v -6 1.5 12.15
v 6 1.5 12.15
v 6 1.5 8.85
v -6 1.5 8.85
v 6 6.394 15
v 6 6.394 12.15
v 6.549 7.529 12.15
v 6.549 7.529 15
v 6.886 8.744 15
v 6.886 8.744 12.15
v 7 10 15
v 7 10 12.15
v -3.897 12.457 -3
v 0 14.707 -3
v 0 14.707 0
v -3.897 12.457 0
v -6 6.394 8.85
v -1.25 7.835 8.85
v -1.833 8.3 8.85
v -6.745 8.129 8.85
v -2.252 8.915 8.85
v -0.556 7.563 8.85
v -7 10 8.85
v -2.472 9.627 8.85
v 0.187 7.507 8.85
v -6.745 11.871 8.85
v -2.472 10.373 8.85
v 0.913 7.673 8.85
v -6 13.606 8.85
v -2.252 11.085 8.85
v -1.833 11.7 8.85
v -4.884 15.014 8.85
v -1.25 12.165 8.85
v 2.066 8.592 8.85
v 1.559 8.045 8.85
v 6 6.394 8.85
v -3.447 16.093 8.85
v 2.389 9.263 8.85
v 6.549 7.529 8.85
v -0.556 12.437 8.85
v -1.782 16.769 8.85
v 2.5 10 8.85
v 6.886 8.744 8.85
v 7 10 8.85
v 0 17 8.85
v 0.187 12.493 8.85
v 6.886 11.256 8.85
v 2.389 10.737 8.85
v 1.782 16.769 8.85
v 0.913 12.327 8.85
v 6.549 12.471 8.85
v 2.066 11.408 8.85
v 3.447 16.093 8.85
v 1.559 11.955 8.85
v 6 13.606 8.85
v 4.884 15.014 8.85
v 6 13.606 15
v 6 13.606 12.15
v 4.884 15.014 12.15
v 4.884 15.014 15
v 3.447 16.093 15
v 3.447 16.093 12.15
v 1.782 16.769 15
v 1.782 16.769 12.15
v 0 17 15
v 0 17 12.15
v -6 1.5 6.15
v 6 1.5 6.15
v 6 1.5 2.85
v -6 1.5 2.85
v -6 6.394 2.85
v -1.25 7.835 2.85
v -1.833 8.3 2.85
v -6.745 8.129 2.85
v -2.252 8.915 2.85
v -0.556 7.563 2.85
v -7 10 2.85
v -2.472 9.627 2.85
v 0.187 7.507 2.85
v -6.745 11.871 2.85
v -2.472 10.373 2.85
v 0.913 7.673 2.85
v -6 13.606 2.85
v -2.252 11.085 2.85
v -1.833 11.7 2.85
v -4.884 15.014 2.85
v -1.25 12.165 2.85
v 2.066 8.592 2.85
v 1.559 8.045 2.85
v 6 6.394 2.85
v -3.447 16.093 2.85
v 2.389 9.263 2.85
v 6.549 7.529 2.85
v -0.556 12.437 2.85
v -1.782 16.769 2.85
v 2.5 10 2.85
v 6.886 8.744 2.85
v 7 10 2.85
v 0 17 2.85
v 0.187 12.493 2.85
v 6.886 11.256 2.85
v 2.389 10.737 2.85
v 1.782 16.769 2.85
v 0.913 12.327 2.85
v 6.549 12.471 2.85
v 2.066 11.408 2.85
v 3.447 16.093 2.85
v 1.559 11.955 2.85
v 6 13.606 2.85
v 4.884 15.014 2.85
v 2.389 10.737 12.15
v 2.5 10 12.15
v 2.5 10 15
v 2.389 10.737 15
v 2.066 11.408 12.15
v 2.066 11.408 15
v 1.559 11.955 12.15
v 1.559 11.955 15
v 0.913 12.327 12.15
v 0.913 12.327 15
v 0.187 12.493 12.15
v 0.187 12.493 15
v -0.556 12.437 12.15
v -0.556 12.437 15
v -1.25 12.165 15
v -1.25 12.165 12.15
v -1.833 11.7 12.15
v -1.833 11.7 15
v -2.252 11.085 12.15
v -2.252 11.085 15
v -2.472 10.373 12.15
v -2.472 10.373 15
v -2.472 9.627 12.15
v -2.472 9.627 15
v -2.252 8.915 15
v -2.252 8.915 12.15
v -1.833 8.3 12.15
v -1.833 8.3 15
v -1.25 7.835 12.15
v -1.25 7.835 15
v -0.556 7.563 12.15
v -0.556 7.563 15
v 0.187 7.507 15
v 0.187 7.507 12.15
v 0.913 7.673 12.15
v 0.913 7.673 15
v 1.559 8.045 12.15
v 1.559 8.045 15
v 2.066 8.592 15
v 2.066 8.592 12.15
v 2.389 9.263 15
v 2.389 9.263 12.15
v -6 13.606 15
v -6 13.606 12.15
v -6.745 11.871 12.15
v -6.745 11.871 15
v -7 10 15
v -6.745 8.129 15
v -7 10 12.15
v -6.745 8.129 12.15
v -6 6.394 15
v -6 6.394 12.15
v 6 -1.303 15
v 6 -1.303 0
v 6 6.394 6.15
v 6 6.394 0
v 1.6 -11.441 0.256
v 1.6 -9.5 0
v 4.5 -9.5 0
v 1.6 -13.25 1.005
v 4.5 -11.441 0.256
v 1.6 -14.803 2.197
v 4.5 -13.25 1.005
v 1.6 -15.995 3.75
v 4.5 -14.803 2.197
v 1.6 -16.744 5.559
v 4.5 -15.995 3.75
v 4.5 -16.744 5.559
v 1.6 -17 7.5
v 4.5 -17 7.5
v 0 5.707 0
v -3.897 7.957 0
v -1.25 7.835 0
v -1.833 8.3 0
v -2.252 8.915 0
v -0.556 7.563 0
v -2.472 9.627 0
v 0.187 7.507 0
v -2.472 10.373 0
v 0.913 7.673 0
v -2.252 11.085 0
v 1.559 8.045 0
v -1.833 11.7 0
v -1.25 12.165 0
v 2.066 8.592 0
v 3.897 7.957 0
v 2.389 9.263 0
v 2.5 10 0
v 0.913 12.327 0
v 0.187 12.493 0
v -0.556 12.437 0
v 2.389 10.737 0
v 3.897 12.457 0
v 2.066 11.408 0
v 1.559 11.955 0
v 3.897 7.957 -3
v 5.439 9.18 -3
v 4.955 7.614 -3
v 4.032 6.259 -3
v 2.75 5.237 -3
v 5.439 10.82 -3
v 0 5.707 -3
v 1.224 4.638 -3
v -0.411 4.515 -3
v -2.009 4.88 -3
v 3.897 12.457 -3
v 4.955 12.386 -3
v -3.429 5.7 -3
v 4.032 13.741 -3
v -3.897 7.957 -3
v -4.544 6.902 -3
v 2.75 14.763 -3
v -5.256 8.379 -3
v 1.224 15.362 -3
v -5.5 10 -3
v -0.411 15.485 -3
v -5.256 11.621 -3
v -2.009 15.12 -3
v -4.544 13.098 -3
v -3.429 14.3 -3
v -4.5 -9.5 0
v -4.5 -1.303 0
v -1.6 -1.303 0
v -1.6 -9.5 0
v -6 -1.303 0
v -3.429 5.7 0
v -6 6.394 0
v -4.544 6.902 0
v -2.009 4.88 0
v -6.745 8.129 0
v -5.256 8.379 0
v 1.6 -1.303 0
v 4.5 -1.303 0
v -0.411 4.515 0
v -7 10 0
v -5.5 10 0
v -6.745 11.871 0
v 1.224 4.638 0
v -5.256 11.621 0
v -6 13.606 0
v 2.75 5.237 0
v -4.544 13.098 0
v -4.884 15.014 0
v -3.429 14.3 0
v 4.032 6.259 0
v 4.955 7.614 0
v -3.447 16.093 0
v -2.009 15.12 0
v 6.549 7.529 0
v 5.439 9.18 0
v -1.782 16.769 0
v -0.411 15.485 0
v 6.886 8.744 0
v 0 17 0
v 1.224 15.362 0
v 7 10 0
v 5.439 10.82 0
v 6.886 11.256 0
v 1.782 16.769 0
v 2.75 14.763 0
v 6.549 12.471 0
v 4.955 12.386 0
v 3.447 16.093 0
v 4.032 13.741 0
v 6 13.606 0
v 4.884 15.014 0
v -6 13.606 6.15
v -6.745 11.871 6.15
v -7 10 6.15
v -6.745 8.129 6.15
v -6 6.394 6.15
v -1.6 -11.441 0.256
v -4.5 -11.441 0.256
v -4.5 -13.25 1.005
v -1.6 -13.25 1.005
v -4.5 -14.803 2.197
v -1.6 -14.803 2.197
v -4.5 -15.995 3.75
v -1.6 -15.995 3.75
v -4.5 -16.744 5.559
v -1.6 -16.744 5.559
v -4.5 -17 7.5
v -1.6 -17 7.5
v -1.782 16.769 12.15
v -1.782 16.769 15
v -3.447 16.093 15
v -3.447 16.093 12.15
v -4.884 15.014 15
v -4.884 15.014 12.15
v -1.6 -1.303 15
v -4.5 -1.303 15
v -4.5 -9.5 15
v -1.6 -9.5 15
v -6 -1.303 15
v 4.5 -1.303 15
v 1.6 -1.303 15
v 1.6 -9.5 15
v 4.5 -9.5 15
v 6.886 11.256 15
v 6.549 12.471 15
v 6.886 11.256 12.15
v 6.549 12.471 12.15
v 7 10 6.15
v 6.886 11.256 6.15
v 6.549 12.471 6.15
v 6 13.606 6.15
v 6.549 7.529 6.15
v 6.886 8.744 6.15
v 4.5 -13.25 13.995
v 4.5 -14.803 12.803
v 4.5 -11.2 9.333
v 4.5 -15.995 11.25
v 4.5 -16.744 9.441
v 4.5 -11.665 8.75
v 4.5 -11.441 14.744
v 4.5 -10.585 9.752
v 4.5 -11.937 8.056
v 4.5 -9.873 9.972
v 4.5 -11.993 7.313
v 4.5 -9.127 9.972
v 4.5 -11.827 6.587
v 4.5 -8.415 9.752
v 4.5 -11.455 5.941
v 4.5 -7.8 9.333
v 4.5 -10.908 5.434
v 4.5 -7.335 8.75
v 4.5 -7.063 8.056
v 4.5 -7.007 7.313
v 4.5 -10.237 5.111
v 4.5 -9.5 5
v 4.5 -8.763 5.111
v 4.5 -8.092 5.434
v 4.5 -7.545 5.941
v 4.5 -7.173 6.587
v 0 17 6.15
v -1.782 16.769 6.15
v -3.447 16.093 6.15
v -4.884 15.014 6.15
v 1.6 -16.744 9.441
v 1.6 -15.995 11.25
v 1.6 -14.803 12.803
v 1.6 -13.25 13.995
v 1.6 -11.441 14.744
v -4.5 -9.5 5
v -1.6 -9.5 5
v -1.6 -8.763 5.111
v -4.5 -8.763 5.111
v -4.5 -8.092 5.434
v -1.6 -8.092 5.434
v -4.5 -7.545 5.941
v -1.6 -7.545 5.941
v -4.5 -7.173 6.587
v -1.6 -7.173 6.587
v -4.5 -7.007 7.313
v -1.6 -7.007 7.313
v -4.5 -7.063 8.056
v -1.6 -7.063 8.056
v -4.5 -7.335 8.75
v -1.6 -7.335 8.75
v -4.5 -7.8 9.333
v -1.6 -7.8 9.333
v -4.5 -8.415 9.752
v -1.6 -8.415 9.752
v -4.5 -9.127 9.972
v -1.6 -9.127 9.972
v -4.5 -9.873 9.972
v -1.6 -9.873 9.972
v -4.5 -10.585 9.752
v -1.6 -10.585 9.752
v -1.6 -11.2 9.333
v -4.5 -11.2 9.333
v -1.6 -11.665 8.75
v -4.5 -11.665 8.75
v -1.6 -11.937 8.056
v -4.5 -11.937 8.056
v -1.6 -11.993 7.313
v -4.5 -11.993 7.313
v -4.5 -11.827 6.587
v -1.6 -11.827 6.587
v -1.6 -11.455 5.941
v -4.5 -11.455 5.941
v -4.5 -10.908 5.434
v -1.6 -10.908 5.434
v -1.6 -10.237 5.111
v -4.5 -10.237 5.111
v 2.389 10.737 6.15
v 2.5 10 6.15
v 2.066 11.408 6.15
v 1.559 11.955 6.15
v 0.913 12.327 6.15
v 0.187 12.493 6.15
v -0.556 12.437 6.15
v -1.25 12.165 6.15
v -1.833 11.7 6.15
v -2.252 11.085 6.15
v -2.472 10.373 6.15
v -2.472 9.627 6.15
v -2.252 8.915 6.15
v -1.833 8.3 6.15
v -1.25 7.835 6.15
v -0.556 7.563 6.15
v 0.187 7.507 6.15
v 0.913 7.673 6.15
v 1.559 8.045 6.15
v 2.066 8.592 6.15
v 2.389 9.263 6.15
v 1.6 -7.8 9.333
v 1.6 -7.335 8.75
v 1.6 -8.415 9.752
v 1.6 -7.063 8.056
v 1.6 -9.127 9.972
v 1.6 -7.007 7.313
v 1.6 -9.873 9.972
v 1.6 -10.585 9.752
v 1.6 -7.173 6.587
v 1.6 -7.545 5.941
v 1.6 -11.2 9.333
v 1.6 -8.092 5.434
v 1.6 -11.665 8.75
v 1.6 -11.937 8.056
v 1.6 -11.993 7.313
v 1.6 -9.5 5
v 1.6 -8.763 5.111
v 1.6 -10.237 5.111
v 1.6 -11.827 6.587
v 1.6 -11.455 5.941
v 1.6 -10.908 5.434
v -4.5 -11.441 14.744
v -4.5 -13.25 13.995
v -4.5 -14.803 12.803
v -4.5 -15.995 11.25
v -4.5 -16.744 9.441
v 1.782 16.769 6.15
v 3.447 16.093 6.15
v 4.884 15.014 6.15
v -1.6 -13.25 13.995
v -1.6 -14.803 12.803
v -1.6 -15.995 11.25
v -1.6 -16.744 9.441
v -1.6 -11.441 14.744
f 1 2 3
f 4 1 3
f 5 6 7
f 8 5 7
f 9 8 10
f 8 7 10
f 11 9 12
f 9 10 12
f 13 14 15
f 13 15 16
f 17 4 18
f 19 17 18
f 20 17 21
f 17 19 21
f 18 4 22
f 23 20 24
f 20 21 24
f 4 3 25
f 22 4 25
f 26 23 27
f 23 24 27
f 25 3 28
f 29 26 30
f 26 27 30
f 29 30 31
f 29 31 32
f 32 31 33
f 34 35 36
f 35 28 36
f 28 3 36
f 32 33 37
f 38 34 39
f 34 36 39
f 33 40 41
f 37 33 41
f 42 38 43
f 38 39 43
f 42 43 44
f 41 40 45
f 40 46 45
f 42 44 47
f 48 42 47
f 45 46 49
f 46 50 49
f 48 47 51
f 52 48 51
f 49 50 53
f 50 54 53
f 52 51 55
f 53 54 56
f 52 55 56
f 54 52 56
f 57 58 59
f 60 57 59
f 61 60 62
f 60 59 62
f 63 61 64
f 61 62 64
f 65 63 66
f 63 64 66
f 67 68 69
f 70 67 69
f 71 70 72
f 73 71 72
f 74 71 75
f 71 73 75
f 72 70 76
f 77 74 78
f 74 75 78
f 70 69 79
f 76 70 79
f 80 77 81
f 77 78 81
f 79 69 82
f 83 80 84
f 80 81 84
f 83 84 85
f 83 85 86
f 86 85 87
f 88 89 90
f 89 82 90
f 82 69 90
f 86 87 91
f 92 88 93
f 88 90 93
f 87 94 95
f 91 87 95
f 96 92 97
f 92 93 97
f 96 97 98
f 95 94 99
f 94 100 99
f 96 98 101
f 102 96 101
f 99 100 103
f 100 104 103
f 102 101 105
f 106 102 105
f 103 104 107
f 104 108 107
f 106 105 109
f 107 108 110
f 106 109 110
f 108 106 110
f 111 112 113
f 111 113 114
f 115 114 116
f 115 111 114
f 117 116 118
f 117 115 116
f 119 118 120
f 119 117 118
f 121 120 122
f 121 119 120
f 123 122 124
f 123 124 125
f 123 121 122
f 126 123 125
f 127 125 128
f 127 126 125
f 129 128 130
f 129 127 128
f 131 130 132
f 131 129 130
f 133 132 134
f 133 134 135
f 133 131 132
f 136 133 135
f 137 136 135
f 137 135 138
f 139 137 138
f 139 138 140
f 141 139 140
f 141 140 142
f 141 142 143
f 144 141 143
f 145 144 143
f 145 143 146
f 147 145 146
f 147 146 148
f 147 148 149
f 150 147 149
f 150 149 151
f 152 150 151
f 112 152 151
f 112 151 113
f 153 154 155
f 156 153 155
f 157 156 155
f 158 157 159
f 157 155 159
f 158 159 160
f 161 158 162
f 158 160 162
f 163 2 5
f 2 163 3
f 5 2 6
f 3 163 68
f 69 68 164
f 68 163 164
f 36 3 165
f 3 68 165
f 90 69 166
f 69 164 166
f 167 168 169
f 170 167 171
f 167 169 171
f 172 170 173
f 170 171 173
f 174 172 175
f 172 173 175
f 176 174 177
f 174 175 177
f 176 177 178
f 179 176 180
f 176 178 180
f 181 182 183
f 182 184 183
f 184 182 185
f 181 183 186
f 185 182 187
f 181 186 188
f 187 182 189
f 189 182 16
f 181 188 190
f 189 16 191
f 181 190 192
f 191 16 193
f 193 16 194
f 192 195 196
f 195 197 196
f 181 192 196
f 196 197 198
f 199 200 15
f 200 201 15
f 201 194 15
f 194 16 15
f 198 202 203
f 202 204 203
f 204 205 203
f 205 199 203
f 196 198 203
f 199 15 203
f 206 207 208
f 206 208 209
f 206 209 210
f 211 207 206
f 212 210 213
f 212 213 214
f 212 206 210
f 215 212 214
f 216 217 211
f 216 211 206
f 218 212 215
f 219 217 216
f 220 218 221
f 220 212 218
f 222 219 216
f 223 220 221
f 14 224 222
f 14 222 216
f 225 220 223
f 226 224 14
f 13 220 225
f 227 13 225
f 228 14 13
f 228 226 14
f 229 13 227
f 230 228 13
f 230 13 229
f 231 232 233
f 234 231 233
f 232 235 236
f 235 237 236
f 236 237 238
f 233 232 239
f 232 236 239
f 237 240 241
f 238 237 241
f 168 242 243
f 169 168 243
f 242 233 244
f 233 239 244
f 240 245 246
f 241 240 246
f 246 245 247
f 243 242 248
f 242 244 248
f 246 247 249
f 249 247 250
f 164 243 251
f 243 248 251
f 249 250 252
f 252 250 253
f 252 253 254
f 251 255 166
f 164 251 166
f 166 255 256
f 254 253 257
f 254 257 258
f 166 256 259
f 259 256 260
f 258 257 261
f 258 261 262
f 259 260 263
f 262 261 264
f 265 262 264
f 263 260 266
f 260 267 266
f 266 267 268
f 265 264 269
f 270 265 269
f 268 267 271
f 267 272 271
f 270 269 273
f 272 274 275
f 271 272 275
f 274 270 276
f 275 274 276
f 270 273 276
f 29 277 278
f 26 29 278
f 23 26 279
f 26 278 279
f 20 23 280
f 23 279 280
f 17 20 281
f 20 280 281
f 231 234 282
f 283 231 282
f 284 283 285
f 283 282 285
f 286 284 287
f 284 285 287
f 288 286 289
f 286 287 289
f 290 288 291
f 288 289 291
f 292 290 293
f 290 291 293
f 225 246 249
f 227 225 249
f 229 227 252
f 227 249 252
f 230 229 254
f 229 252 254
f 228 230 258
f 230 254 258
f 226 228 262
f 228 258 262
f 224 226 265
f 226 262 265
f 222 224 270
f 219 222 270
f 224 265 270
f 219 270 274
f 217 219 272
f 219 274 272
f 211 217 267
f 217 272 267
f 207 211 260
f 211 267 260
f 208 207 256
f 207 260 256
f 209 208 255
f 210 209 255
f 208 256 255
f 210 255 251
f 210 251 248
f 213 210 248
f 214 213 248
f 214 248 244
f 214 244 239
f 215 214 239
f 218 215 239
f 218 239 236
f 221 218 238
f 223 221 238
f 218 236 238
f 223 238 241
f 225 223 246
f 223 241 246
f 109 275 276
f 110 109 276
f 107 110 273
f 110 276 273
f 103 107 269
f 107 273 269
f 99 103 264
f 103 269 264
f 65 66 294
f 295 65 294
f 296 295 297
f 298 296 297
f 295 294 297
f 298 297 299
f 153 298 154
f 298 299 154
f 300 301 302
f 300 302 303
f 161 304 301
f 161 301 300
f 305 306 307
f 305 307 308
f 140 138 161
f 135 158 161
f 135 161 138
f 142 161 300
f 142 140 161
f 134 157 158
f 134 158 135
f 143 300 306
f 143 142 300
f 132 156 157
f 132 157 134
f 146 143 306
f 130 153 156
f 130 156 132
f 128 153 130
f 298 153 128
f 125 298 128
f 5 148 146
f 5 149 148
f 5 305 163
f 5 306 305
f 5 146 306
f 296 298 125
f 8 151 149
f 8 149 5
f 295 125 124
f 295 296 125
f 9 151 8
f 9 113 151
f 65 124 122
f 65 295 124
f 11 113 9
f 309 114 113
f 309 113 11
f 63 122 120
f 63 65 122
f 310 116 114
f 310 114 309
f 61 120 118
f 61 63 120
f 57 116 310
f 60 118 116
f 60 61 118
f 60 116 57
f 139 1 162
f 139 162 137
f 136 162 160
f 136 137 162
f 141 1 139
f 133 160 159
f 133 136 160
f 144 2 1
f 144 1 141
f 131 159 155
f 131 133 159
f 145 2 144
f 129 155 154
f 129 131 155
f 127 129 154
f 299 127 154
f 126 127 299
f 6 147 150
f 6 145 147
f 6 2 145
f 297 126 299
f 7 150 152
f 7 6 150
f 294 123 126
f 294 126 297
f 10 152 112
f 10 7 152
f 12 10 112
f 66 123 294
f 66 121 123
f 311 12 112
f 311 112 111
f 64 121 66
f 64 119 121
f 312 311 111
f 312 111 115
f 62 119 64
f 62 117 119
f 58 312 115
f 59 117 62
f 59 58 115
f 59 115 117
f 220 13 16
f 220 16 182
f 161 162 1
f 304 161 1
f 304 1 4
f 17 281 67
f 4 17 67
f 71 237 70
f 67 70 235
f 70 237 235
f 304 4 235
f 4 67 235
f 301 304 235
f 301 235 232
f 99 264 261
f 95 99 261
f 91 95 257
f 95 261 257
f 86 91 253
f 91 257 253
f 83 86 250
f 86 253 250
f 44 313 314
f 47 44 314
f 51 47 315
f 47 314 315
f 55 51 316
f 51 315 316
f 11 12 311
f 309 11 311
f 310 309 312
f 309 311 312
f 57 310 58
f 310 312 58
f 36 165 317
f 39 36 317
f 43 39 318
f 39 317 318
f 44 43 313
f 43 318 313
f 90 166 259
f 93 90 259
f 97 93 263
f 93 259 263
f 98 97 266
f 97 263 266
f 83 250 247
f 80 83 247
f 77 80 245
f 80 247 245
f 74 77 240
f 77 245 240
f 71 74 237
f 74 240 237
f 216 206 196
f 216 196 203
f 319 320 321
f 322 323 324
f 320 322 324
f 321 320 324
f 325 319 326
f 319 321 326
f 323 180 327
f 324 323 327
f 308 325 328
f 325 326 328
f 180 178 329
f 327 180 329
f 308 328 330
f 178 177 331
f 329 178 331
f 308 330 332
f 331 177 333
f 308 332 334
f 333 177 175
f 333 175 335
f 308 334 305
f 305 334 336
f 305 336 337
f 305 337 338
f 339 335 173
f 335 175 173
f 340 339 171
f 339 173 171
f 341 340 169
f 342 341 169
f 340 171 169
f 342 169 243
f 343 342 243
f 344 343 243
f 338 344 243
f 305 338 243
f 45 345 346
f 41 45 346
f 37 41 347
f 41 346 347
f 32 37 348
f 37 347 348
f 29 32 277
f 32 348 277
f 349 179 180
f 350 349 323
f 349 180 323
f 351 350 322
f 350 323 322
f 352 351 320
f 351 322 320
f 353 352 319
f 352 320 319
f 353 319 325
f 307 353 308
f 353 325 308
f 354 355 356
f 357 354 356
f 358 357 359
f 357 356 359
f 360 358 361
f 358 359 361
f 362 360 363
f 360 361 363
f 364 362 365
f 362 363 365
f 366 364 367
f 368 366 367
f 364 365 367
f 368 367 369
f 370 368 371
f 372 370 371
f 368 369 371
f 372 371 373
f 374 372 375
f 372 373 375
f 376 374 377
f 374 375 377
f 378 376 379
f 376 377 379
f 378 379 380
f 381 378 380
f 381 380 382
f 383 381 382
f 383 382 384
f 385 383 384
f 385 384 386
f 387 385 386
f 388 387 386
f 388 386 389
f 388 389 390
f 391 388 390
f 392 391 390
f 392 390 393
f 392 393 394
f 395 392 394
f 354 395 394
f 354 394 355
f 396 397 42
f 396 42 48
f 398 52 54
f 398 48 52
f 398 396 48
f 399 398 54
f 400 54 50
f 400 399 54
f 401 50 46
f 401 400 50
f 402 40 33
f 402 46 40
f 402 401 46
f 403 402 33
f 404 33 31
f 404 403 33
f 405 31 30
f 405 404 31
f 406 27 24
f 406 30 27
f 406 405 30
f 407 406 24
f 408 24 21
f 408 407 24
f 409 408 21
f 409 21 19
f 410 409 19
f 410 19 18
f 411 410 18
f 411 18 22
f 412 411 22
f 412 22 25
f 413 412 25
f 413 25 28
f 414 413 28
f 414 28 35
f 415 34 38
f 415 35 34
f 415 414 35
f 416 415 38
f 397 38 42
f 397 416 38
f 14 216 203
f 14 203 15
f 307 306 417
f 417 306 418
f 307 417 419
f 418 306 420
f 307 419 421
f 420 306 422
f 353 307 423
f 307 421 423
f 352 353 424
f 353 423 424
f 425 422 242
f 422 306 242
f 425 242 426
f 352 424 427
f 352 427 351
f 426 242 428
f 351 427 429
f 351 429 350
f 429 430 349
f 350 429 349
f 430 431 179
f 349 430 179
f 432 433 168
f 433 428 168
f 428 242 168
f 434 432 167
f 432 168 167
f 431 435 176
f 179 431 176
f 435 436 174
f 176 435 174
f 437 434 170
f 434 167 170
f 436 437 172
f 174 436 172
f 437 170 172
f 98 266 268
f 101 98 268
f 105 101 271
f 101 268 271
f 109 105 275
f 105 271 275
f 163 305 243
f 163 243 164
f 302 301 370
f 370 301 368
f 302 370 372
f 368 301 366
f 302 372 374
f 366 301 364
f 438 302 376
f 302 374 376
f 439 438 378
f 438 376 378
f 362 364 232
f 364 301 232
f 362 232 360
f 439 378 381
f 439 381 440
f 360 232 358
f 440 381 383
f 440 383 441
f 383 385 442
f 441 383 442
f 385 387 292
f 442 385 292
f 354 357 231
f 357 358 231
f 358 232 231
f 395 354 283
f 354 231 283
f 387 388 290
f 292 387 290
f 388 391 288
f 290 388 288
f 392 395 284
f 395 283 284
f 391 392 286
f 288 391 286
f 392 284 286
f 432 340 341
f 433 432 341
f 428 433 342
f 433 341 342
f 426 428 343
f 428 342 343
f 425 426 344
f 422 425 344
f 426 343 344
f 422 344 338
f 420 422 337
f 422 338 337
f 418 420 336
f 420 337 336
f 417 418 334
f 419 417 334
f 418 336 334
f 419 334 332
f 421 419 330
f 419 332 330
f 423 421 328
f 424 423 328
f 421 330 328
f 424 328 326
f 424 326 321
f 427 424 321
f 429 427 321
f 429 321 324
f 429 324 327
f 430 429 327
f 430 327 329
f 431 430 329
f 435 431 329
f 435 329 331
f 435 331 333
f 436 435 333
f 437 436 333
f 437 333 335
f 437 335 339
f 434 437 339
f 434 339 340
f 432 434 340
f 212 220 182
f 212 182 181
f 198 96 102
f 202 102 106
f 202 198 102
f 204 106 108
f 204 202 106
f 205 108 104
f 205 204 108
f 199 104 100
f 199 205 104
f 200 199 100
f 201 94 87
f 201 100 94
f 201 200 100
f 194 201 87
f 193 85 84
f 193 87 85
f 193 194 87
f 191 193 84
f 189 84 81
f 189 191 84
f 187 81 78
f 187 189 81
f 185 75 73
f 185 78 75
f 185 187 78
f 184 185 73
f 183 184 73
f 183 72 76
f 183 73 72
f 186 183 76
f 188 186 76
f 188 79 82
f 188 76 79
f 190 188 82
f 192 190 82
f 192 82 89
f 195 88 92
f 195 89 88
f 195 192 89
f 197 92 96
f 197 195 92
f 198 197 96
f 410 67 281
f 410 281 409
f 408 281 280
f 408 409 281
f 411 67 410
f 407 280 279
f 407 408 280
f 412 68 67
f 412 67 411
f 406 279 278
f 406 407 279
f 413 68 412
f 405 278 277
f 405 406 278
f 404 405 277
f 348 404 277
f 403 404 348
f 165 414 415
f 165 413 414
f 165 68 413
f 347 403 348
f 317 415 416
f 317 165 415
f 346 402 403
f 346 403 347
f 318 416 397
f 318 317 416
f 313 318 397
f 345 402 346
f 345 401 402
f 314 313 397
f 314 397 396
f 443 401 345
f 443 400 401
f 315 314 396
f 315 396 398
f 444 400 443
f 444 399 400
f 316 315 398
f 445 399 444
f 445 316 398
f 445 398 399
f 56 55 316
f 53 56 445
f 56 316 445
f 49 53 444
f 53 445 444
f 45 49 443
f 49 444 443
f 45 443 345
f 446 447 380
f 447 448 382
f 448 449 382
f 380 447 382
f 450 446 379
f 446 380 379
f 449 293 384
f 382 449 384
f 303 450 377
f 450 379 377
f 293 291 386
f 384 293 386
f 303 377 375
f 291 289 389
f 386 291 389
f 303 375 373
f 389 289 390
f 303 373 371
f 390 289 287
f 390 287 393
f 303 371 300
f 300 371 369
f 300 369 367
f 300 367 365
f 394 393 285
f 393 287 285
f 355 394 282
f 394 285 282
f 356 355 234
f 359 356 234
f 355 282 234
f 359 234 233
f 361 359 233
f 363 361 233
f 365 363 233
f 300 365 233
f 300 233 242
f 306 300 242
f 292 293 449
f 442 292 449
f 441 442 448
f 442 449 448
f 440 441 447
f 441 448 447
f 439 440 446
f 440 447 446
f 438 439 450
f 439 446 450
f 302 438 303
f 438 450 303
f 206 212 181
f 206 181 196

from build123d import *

# Parameters (mm, degrees)
ESQUISSE1_R                  = 2.5
BOSS_EXTRU_1_DEPTH           = 15
ESQUISSE2_W                  = 3.3
ESQUISSE2_H                  = 15.5
ENL_V_MAT_EXTRU_1_DEPTH      = 3.5
ENL_V_MAT_EXTRU_1_DEPTH_BACK = 12.5
ESQUISSE5_R                  = 2.5
ENL_V_MAT_EXTRU_4_DEPTH      = 10
ESQUISSE6_R                  = 5.5
ESQUISSE6_R_2                = 2.5
BOSS_EXTRU_2_DEPTH           = 3
ENL_V_MAT_EXTRU_5_DEPTH      = 3


with BuildPart() as part:
    # Esquisse1 → Boss.-Extru.1 (new body)
    with BuildSketch(Plane.XY):
        with BuildLine():
            Line((-4.5, -1.302598386), (-4.5, -17))
            Line((-4.5, -17), (-1.6, -17))
            Line((-1.6, -17), (-1.6, -1.302598386))
            Line((-1.6, -1.302598386), (1.6, -1.302598386))
            Line((1.6, -1.302598386), (1.6, -17))
            Line((1.6, -17), (4.5, -17))
            Line((4.5, -17), (4.5, -1.302598386))
            Line((4.5, -1.302598386), (6, -1.302598386))
            Line((6, -1.302598386), (6, 6.394448725))
            ThreePointArc((6, 6.394448725), (0, 3), (-6, 6.394448725))
            Line((-6, 6.394448725), (-6, -1.302598386))
            Line((-6, -1.302598386), (-4.5, -1.302598386))
        make_face()
        with BuildLine():
            Line((-6, 13.605551275), (-6, 6.394448725))
            ThreePointArc((-6, 6.394448725), (0, 3), (6, 6.394448725))
            Line((6, 6.394448725), (6, 13.605551275))
            ThreePointArc((6, 13.605551275), (3.446820352, 16.092571663), (0, 17))
            ThreePointArc((0, 17), (-3.446820352, 16.092571663), (-6, 13.605551275))
        make_face()
        with Locations((0, 10)):
            Circle(ESQUISSE1_R, mode=Mode.SUBTRACT)
        with BuildLine():
            Line((6, 13.605551275), (6, 6.394448725))
            ThreePointArc((6, 6.394448725), (6.745368782, 8.129171307), (7, 10))
            ThreePointArc((7, 10), (6.745368782, 11.870828693), (6, 13.605551275))
        make_face()
        with BuildLine():
            ThreePointArc((-6, 13.605551275), (-7, 10), (-6, 6.394448725))
            Line((-6, 6.394448725), (-6, 13.605551275))
        make_face()
    extrude(amount=BOSS_EXTRU_1_DEPTH)

    # Esquisse2 → Enlèv. mat.-Extru.1 (cut, two sides)
    with BuildSketch(Plane(origin=(4.5, 0, 0), x_dir=(0, 0, -1), z_dir=(1, 0, 0))) as enl_v_mat_extru_1_sk:
        with Locations((-10.5, 9.25)):
            Rectangle(ESQUISSE2_W, ESQUISSE2_H)
        with Locations((-4.5, 9.25)):
            Rectangle(ESQUISSE2_W, ESQUISSE2_H)
    extrude(amount=ENL_V_MAT_EXTRU_1_DEPTH, mode=Mode.SUBTRACT)
    extrude(enl_v_mat_extru_1_sk.sketch, amount=-ENL_V_MAT_EXTRU_1_DEPTH_BACK, mode=Mode.SUBTRACT)

    # Esquisse5 → Enlèv. mat.-Extru.4 (cut)
    with BuildSketch(Plane(origin=(4.5, 0, 0), x_dir=(0, 0, -1), z_dir=(1, 0, 0))):
        with BuildLine():
            ThreePointArc((-7.5, -17), (-12.803300859, -14.803300859), (-15, -9.5))
            Line((-15, -9.5), (-15, -17))
            Line((-15, -17), (-7.5, -17))
        make_face()
        with BuildLine():
            Line((0, -17), (0, -9.5))
            ThreePointArc((0, -9.5), (-2.196699141, -14.803300859), (-7.5, -17))
            Line((-7.5, -17), (0, -17))
        make_face()
        with Locations((-7.5, -9.5)):
            Circle(ESQUISSE5_R)
    extrude(amount=-ENL_V_MAT_EXTRU_4_DEPTH, mode=Mode.SUBTRACT)

    # Esquisse6 → Boss.-Extru.2 (add)
    with BuildSketch(Plane(origin=(0, 0, 0), x_dir=(-1, 0, 0), z_dir=(0, 0, -1))):
        with Locations((0, 10)):
            Circle(ESQUISSE6_R)
        with Locations((0, 10)):
            Circle(ESQUISSE6_R_2, mode=Mode.SUBTRACT)
    extrude(amount=BOSS_EXTRU_2_DEPTH)

    # Esquisse7 → Enlèv. mat.-Extru.5 (cut)
    with BuildSketch(Plane(origin=(0, 0, -3), x_dir=(-1, 0, 0), z_dir=(0, 0, -1))):
        Polygon((0, 14.70707265), (3.897114317, 12.45707265), (3.897114317, 7.95707265), (0, 5.70707265), (-3.897114317, 7.95707265), (-3.897114317, 12.45707265), align=None)
    extrude(amount=-ENL_V_MAT_EXTRU_5_DEPTH, mode=Mode.SUBTRACT)


solid = part.part
